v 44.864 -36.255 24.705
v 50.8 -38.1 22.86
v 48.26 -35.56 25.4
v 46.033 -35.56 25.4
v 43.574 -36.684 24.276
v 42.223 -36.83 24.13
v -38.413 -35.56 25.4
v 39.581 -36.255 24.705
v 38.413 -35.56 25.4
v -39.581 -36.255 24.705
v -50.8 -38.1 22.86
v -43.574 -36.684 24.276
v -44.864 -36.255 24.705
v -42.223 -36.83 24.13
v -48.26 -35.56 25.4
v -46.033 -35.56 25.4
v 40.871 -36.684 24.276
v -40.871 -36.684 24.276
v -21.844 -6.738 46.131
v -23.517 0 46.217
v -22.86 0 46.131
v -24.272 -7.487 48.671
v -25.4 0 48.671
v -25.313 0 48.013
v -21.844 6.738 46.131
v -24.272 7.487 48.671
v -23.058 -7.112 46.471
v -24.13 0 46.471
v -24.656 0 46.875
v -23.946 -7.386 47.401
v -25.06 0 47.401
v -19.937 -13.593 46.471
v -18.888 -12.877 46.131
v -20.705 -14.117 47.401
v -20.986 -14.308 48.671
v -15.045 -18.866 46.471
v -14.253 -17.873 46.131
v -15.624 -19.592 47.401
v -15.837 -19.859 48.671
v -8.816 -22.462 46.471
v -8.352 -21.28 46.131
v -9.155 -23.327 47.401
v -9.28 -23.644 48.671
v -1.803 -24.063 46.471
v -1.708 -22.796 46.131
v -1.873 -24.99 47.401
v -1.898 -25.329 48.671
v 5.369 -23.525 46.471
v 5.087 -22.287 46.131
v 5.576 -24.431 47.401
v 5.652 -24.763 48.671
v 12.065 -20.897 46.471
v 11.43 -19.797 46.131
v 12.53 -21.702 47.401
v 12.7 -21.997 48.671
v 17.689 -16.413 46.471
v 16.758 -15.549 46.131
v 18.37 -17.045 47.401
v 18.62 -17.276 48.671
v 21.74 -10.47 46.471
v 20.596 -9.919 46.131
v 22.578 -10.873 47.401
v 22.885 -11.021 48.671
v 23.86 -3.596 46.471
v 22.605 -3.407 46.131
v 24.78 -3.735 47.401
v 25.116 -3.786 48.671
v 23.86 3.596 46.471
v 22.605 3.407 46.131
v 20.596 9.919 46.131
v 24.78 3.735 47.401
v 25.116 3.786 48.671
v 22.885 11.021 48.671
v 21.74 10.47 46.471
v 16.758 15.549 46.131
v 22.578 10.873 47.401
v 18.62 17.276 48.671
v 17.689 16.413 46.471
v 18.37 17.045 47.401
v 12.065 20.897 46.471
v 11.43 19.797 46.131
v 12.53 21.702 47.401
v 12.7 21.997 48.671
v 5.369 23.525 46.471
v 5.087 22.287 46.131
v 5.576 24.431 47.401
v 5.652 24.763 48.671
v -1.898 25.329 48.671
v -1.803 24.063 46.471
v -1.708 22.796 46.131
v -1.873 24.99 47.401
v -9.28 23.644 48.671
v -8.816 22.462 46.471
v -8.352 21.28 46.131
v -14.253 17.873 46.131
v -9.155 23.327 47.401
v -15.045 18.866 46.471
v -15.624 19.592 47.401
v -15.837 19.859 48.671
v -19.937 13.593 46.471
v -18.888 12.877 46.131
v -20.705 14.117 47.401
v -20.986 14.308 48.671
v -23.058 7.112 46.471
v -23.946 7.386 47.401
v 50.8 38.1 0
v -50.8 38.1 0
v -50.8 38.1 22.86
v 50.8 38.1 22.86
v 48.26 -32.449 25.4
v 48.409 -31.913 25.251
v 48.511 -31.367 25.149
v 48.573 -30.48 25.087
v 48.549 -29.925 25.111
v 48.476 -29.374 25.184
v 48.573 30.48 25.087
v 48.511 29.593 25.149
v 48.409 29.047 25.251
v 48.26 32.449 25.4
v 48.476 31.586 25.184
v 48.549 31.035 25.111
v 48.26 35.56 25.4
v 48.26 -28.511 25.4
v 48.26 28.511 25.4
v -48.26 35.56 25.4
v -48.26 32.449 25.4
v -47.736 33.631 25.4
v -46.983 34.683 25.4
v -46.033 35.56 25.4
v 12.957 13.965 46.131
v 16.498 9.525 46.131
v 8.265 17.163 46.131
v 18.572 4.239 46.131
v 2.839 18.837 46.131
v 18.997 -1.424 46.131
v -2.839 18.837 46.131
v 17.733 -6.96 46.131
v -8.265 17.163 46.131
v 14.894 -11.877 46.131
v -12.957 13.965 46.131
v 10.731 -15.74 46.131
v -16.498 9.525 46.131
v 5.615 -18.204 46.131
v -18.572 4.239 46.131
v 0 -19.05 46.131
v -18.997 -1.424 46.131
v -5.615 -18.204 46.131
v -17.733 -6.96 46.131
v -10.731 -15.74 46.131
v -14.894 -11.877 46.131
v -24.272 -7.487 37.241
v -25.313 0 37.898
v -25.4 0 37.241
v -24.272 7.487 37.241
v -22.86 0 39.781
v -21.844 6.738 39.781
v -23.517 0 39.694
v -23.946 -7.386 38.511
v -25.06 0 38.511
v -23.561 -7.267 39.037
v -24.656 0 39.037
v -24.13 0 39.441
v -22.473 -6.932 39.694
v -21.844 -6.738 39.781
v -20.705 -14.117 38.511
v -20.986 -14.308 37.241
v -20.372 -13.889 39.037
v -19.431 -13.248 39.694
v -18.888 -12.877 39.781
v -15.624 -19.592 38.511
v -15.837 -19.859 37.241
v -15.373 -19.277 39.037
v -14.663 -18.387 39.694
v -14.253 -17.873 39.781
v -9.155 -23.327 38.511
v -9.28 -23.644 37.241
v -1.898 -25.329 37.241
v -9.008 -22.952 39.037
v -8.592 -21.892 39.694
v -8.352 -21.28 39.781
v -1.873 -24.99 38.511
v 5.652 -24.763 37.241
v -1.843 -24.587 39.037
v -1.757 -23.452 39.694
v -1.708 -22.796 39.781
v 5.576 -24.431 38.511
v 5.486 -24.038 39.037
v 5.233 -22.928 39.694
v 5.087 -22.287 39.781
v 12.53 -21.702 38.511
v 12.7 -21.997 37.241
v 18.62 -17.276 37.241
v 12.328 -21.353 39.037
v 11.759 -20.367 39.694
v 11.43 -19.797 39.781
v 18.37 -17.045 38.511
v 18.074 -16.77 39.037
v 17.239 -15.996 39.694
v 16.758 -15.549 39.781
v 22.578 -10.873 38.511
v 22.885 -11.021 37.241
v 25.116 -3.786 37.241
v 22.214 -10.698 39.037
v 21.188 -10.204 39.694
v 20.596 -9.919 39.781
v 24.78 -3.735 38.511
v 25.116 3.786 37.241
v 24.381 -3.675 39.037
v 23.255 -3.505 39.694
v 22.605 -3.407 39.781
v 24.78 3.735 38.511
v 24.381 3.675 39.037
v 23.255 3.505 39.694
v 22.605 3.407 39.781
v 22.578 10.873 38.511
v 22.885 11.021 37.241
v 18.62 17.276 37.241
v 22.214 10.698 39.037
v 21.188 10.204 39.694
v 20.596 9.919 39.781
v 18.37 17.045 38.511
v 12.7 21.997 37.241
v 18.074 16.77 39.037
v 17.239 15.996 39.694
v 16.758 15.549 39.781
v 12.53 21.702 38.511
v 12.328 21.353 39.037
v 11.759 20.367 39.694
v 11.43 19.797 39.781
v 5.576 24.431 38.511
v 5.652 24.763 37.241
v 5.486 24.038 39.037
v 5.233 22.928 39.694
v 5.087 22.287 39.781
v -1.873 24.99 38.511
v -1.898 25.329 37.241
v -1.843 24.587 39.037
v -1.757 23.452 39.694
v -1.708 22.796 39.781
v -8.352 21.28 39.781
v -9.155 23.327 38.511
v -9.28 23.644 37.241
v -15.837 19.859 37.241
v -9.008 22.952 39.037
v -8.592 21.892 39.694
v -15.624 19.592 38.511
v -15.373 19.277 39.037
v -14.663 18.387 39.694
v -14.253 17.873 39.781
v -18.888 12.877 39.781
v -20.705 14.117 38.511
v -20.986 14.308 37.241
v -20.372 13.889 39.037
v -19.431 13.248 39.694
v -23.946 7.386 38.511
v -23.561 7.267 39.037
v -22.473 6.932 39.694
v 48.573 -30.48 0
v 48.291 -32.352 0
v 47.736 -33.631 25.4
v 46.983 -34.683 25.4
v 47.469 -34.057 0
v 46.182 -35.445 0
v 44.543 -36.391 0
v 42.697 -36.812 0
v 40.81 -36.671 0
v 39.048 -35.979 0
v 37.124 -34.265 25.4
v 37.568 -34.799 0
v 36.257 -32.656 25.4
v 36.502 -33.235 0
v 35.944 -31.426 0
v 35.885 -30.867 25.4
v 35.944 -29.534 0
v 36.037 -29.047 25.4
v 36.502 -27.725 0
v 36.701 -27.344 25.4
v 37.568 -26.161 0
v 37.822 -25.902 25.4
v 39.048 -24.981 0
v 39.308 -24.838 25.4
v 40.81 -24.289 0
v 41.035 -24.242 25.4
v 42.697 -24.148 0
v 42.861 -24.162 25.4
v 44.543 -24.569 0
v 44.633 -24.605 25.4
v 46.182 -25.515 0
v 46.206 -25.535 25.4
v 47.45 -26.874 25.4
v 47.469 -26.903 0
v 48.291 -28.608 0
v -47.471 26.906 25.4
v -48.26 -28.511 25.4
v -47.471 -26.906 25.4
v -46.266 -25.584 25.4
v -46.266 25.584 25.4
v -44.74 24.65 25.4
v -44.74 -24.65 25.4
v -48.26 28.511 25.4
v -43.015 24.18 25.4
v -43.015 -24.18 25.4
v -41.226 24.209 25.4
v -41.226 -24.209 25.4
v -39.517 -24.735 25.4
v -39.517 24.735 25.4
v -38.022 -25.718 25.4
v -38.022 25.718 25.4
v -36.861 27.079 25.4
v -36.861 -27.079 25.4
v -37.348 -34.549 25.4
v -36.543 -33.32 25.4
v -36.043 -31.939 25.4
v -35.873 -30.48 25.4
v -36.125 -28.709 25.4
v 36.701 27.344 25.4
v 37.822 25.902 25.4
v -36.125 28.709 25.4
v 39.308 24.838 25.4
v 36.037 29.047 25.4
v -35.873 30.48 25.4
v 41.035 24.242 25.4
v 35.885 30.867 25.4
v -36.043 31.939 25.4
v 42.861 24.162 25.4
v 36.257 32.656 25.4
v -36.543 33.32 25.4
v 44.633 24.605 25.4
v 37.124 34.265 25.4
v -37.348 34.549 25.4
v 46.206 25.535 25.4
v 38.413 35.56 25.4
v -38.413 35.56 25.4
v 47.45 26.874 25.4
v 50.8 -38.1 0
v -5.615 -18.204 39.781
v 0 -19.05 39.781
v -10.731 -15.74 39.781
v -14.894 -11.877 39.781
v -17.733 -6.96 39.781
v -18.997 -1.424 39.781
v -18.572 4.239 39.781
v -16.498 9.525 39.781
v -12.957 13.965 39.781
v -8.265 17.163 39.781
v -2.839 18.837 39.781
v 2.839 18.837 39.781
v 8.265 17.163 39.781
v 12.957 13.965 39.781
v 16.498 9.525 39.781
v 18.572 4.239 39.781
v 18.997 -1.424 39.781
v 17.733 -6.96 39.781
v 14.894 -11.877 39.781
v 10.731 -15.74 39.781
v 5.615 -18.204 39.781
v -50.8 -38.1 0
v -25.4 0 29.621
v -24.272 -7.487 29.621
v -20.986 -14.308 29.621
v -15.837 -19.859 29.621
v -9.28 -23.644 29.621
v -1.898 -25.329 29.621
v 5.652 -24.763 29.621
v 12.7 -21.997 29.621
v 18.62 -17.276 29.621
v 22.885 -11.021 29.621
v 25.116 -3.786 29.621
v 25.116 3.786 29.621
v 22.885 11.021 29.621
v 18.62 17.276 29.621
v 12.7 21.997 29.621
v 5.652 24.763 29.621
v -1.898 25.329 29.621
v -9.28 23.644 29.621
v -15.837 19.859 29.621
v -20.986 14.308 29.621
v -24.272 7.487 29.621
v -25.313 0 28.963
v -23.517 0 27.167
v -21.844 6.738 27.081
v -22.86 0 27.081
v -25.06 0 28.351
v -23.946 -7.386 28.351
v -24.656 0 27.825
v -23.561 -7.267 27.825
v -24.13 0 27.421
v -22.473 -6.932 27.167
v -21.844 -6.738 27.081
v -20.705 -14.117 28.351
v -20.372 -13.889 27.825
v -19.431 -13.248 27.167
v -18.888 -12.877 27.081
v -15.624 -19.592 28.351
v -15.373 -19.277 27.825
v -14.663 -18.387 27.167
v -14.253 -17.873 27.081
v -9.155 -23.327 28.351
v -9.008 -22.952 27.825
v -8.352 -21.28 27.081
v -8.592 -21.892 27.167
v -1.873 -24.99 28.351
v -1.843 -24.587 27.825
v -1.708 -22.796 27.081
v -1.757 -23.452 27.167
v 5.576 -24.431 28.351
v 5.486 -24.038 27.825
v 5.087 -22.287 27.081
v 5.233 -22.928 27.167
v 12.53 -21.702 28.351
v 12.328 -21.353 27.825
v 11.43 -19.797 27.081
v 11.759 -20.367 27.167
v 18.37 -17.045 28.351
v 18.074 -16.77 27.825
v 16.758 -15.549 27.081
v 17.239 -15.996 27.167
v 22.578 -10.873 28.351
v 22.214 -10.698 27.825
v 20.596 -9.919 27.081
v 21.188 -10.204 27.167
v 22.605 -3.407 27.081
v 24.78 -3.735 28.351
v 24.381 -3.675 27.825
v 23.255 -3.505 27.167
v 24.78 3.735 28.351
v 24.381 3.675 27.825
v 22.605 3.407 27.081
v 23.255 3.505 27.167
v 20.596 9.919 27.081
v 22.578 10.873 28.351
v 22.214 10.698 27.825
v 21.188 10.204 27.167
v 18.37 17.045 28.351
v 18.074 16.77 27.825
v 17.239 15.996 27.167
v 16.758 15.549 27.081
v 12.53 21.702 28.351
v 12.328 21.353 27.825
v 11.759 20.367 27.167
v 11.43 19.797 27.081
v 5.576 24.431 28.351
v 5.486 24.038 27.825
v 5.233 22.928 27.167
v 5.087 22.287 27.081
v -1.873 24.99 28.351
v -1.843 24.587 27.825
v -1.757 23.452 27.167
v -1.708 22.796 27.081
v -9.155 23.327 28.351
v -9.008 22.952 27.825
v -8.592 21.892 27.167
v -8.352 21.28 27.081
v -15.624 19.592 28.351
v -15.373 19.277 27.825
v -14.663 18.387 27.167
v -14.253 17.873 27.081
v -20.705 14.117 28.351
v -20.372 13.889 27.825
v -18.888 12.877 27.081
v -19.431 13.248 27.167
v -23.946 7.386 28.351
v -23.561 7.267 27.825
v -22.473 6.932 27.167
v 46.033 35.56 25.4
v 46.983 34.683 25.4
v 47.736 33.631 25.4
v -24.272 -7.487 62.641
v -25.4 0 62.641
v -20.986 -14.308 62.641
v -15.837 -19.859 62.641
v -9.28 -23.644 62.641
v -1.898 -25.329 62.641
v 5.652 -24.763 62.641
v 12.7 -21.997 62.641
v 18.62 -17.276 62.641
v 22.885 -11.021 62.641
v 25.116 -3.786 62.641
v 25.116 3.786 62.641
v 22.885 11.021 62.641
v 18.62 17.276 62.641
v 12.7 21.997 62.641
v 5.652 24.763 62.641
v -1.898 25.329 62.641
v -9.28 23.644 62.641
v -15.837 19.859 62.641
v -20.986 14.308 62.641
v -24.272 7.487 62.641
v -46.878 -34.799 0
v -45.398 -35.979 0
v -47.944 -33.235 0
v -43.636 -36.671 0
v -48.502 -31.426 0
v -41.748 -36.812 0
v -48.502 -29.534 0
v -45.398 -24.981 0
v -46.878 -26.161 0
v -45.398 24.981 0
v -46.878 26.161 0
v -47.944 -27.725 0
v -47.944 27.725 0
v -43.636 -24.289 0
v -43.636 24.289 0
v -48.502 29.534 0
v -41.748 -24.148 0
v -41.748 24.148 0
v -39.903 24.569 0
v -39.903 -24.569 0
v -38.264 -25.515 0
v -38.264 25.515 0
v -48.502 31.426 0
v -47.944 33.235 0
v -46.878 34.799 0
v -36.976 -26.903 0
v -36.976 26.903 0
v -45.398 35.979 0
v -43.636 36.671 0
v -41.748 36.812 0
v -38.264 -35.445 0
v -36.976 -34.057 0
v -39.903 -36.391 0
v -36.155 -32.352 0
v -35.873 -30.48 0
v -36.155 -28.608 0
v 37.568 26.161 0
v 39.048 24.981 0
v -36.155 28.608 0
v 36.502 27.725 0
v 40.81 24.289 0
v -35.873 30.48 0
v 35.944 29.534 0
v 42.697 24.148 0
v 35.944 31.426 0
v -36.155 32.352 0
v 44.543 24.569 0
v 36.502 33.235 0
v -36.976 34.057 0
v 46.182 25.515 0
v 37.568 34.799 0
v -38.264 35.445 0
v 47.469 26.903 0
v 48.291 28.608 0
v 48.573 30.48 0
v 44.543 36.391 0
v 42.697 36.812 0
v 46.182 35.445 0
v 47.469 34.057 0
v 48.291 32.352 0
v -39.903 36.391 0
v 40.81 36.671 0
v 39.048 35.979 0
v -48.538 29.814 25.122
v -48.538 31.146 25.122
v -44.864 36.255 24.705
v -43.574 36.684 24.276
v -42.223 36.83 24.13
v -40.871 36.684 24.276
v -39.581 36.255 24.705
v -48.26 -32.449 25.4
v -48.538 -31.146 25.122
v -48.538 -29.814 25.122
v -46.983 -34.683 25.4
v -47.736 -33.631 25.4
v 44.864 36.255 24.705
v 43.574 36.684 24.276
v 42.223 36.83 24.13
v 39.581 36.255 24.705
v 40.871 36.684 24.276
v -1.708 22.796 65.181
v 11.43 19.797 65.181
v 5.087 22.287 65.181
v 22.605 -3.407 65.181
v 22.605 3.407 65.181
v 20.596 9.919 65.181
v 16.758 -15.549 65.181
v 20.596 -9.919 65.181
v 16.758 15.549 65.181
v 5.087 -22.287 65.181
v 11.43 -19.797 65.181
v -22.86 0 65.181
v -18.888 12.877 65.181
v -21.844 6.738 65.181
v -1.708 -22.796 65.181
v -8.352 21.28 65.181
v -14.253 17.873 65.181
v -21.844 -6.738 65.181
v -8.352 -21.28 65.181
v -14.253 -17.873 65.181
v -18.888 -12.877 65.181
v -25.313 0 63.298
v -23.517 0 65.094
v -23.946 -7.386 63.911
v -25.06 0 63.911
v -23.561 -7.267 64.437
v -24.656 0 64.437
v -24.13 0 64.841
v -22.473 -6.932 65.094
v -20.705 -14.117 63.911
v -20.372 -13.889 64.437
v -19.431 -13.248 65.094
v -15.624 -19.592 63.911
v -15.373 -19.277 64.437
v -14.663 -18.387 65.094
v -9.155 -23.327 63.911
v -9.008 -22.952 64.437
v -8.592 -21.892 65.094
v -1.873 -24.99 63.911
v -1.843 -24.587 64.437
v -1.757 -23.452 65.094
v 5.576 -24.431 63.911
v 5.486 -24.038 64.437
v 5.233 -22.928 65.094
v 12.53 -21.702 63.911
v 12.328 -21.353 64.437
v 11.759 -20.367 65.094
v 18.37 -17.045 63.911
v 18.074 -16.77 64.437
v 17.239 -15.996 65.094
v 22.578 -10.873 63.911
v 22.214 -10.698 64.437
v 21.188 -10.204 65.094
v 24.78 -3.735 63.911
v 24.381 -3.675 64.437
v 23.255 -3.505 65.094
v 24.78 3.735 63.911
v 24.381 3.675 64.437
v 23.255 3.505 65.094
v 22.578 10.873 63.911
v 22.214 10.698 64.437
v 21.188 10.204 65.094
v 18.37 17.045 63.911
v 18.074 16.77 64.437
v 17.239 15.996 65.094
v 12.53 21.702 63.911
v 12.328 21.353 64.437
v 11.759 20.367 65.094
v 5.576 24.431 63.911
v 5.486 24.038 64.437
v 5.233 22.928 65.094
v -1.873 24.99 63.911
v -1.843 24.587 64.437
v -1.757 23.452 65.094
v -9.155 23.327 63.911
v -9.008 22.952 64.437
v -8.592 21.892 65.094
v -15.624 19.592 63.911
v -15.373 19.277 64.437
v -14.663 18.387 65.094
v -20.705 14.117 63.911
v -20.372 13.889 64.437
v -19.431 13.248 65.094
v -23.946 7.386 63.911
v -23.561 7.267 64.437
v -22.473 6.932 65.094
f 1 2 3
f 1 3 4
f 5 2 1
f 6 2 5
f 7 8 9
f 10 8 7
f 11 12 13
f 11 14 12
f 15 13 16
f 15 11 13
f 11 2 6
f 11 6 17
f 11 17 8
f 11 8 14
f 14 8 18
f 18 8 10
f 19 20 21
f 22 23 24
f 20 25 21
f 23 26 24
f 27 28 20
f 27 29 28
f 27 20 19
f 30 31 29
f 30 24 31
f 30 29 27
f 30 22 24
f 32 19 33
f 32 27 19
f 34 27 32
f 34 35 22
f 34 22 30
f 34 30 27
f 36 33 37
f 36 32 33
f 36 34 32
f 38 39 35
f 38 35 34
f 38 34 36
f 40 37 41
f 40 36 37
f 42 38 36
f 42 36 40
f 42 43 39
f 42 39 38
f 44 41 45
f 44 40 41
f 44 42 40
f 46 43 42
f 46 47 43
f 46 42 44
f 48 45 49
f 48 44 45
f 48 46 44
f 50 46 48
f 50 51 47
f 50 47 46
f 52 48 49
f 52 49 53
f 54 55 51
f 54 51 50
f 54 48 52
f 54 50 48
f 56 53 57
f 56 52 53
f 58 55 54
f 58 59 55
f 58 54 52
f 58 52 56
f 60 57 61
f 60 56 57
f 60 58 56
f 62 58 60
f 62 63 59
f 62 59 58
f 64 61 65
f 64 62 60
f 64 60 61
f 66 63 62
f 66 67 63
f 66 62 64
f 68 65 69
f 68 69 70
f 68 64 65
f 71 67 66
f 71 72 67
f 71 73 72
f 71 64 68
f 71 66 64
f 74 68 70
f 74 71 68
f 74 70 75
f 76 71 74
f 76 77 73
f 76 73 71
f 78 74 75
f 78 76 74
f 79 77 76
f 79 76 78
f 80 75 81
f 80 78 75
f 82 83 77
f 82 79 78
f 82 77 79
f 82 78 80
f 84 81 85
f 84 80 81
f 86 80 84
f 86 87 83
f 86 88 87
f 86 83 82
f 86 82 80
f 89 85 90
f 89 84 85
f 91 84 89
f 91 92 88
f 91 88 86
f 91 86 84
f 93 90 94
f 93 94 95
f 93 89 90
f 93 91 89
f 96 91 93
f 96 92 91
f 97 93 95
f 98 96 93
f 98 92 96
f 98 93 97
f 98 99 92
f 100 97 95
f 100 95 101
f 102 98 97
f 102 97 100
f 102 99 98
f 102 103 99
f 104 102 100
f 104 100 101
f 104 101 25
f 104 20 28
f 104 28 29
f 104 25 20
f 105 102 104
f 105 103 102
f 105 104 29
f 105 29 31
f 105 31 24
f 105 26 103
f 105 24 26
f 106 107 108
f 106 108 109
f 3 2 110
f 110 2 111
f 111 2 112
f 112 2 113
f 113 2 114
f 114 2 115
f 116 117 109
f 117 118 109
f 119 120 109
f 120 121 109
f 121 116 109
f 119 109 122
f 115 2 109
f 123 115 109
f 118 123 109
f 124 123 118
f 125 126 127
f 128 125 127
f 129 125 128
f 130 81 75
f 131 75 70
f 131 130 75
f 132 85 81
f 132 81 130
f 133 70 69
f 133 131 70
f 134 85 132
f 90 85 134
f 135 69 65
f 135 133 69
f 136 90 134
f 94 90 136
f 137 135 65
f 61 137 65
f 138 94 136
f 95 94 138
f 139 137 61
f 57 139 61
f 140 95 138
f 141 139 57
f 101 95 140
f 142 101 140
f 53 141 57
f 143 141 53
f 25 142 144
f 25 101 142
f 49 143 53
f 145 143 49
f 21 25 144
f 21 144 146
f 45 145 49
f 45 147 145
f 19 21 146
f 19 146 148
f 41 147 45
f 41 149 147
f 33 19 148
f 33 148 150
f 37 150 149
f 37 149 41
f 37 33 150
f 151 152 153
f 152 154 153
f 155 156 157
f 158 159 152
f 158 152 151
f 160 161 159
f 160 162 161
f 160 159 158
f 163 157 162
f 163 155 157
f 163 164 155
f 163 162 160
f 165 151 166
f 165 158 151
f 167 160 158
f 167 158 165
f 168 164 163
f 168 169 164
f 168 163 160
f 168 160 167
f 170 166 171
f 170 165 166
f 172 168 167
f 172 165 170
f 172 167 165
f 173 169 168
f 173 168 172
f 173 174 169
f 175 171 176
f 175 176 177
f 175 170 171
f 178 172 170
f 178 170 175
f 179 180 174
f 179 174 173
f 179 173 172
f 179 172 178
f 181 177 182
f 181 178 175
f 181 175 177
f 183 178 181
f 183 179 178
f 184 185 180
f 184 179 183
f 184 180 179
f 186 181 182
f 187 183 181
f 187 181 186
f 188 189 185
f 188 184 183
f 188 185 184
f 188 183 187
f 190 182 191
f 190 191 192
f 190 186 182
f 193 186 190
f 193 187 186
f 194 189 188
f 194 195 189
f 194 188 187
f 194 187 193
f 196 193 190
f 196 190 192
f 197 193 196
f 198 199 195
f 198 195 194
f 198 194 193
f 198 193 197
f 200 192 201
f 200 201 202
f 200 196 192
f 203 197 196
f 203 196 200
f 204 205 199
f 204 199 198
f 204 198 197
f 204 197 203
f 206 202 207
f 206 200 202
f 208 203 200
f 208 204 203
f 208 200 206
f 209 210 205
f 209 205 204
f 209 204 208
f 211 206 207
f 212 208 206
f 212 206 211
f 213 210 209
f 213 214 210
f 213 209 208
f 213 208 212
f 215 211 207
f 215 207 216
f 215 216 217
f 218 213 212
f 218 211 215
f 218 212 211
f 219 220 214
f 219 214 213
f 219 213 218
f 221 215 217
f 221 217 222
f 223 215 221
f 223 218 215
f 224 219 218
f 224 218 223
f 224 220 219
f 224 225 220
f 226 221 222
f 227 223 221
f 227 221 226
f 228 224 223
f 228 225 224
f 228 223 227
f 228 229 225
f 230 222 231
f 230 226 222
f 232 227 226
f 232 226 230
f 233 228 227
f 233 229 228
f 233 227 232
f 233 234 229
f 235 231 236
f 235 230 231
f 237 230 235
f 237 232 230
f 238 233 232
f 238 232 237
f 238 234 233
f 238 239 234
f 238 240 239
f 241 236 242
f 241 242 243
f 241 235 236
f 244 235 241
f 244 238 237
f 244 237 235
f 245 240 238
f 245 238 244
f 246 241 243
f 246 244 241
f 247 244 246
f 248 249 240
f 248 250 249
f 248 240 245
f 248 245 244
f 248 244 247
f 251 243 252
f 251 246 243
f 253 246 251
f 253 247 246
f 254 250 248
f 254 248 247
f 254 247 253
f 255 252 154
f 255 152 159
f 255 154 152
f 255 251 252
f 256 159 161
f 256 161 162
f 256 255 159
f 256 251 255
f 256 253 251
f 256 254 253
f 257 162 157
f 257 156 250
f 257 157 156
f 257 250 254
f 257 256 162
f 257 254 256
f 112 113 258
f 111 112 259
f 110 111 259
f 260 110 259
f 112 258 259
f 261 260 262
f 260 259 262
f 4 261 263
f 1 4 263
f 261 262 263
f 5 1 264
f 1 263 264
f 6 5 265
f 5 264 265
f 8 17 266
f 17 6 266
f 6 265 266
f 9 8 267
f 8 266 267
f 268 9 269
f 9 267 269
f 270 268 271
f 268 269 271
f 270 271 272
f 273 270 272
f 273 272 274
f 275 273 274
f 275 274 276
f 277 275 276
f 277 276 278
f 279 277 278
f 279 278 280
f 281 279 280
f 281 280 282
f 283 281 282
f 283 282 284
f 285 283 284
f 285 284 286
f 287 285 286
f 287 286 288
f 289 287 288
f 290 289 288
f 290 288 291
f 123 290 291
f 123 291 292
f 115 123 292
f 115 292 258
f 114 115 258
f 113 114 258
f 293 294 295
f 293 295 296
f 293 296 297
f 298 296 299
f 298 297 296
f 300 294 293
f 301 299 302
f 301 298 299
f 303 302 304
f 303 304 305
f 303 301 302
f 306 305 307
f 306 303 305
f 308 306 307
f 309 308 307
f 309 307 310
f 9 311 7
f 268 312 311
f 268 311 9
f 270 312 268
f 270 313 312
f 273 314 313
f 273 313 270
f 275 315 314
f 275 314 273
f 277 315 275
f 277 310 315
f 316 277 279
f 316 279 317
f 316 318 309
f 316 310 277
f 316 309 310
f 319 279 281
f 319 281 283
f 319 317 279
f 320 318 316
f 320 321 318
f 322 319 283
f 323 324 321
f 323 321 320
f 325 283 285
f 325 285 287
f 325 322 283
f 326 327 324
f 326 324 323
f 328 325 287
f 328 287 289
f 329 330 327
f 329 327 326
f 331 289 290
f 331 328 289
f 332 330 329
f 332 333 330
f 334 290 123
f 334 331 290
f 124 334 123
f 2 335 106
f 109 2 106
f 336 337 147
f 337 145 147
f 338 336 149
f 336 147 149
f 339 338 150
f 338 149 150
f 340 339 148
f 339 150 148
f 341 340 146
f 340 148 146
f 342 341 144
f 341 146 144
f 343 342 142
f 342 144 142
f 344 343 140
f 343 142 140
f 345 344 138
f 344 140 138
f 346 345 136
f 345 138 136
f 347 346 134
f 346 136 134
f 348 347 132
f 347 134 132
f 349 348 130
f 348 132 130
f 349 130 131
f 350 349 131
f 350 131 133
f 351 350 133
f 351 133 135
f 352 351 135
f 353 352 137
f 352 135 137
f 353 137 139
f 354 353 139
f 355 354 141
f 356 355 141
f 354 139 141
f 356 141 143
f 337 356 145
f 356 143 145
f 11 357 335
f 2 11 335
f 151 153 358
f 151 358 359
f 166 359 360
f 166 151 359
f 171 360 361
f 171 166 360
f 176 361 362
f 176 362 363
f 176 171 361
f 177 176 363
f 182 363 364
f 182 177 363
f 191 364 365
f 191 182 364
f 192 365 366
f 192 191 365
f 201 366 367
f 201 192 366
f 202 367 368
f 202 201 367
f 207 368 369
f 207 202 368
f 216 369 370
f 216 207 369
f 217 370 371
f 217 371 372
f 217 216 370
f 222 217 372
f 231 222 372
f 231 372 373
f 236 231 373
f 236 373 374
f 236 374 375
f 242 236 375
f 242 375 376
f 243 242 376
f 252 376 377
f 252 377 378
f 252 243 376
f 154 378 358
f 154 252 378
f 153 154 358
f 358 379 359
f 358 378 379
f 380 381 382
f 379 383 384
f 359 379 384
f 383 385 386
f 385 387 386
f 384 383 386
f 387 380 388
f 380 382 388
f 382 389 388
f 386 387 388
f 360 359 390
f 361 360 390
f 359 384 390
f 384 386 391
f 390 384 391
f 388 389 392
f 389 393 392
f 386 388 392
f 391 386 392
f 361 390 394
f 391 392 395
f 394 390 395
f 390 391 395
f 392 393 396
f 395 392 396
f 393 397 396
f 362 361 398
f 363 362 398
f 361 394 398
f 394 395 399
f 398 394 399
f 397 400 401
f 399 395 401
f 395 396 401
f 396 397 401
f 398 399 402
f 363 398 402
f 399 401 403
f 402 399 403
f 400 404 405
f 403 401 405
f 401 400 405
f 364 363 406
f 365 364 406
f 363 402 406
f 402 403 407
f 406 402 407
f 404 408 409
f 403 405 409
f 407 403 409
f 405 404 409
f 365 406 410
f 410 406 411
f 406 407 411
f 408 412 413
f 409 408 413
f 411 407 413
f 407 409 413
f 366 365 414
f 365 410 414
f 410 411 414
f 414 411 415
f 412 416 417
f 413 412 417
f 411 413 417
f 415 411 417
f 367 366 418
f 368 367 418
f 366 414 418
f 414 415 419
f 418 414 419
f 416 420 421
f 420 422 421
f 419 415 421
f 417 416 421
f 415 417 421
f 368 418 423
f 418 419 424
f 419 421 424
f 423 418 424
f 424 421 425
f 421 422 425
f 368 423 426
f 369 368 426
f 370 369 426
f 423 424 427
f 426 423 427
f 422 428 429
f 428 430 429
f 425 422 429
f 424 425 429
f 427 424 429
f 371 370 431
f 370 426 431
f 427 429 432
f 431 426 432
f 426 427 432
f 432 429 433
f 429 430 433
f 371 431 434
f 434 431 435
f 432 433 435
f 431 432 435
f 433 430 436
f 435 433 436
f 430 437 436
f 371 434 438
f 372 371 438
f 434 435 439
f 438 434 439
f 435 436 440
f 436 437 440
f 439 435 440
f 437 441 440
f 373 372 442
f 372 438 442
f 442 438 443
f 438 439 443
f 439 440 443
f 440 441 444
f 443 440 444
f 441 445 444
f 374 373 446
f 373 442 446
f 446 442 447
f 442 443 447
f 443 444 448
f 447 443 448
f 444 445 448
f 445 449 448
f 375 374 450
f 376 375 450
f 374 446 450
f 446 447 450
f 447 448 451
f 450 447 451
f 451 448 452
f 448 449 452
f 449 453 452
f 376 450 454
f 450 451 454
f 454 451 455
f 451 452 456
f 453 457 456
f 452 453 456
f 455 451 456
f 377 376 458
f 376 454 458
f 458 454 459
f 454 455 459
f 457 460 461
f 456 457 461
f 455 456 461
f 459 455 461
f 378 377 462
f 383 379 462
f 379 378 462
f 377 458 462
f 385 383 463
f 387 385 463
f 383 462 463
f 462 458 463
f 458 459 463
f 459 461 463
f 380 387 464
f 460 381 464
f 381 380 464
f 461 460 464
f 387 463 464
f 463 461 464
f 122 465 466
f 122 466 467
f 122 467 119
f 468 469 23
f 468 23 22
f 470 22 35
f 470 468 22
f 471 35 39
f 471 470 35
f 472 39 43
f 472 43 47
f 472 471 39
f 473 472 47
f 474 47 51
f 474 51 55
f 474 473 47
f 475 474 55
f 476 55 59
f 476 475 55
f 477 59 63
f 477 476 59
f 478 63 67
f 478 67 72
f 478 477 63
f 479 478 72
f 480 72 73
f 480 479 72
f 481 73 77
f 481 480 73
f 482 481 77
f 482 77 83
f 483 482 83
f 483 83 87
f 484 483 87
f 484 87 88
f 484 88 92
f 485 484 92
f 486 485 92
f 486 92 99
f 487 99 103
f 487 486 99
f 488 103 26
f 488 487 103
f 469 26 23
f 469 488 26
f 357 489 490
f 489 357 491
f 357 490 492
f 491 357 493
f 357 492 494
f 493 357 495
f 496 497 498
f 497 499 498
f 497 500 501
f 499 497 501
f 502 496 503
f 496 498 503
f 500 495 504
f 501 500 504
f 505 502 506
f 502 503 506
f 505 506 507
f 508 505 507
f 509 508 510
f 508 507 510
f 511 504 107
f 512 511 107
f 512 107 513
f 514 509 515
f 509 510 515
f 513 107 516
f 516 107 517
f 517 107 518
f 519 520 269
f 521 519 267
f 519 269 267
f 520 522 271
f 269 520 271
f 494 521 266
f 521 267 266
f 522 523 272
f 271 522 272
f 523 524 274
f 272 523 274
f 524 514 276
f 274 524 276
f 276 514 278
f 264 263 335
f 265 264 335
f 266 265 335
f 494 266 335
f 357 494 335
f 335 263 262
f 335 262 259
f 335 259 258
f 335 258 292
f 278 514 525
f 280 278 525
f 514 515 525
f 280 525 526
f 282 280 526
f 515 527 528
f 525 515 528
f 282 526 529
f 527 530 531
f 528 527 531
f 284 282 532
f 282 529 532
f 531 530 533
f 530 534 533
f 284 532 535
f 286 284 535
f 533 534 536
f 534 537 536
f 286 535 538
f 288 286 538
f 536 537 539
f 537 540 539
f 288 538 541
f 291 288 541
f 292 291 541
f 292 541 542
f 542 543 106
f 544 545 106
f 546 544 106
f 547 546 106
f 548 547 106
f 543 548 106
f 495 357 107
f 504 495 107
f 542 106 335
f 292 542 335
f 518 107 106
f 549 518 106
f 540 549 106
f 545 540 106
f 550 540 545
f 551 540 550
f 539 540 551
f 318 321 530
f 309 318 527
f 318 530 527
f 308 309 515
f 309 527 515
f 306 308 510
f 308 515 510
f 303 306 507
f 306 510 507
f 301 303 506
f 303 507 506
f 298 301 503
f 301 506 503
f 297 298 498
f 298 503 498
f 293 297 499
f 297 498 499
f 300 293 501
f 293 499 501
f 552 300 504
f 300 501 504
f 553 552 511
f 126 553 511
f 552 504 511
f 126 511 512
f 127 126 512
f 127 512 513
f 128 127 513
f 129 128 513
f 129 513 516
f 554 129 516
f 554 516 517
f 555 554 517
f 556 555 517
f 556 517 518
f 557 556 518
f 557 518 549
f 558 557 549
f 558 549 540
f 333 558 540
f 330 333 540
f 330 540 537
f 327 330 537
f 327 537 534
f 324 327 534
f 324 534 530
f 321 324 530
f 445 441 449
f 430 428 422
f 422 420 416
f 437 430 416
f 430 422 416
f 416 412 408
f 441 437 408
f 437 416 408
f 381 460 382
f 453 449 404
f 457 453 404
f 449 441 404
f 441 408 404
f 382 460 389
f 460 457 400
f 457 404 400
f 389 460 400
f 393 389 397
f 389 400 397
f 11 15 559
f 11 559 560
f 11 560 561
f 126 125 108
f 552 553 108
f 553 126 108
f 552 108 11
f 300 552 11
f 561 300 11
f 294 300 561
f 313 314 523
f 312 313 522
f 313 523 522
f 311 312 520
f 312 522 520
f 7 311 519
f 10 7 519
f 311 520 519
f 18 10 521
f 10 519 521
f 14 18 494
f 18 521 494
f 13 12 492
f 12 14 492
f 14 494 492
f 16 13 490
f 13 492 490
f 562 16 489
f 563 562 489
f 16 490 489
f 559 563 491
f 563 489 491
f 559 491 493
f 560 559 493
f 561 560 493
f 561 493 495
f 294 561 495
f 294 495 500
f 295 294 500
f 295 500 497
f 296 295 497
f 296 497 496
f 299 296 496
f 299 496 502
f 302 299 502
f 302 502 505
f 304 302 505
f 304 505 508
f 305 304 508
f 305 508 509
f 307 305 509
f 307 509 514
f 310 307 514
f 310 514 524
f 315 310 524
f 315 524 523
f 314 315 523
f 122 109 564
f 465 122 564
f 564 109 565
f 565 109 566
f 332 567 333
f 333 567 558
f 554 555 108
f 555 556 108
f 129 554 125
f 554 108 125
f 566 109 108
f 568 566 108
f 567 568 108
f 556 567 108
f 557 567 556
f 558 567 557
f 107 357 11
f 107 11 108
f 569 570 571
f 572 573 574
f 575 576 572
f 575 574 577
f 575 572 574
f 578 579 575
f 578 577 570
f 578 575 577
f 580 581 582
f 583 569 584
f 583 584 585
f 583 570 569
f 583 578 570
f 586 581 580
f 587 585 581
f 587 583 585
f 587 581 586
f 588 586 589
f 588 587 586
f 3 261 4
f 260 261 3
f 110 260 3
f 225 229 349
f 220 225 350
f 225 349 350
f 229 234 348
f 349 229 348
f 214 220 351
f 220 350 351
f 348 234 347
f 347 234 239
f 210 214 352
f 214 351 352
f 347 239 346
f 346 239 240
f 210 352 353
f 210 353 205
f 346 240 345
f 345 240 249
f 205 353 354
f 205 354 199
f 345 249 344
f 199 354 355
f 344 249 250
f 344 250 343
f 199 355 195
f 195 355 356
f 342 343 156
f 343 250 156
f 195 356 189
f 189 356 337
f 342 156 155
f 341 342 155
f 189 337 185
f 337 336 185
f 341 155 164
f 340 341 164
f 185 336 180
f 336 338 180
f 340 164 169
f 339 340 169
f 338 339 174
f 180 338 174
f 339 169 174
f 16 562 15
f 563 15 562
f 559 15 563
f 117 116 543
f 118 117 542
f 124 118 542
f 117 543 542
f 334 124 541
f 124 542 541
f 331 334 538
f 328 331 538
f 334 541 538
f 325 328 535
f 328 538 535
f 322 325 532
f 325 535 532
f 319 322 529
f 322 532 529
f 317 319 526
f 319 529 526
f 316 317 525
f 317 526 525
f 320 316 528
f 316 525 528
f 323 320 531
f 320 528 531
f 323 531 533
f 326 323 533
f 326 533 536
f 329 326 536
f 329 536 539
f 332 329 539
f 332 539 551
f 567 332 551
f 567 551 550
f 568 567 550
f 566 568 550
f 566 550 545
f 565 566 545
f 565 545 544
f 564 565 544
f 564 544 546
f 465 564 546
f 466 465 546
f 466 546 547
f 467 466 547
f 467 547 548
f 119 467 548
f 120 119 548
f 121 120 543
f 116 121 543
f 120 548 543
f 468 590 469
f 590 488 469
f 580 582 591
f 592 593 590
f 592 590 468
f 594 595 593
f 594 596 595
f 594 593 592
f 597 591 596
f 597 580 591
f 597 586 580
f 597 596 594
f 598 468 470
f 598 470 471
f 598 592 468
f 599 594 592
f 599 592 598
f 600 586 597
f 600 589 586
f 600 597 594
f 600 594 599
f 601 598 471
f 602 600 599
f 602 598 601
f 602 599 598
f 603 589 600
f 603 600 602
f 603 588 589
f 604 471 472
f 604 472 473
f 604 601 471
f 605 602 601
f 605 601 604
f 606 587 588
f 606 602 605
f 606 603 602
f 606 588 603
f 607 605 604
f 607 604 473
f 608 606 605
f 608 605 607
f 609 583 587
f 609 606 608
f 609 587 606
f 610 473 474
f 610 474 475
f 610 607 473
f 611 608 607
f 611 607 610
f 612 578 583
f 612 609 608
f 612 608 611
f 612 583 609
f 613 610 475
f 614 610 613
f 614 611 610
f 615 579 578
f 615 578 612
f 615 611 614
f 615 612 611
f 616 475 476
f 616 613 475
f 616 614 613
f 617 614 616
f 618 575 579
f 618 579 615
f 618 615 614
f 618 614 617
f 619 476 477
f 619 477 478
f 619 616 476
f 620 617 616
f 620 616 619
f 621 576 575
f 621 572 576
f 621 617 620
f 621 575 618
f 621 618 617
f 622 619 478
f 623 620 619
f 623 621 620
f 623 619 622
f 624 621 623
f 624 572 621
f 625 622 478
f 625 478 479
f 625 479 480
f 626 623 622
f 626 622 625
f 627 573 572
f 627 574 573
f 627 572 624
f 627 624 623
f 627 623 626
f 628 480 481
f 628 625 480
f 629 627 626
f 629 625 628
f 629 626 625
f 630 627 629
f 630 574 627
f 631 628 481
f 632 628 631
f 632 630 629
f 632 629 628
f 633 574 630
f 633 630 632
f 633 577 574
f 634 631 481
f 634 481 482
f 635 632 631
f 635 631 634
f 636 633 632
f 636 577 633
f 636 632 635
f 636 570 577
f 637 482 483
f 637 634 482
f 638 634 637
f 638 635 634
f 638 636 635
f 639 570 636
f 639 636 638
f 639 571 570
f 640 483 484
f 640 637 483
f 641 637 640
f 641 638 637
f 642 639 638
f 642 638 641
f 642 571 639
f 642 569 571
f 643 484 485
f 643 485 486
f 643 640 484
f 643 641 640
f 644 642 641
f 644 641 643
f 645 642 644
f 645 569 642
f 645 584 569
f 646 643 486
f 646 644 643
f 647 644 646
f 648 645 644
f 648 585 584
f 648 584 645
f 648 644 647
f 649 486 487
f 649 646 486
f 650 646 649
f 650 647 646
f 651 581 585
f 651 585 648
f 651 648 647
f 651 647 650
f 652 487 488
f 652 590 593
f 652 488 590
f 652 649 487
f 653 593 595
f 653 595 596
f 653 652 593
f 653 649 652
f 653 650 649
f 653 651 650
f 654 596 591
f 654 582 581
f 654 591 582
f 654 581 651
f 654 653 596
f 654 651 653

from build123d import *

# Parameters (mm, degrees)
F0_W        = 101.6
F0_H        = 76.2
F1_DEPTH    = 25.4
F2_R        = 6.35
F3_DEPTH    = 25.4
F4_W        = 25.4
F4_H        = 38.1
F6_W        = 23.2788839974
F6_H        = 6.35
F8_T1_DEPTH = 114.6641495789
F8_T3_DEPTH = 89.2641495789
F9_R        = 2.54


# Not quite as in the source:
# - a fillet or chamfer that OpenCascade refuses, or shapes differently, is made with other operations: its cross-section is extruded or revolved along the edge and cut away or added
# - a feature names something its author has since deleted; it is built from what else it names


with BuildPart() as f1:
    # F0 (on Top) → F1 (new body)
    with BuildSketch(Plane.XY):
        Rectangle(F0_W, F0_H)
    extrude(amount=F1_DEPTH)

    # F2 (on face) → F3 (cut)
    with BuildSketch(Plane(origin=(0, 0, 0), x_dir=(1, 0, 0), z_dir=(0, 0, -1))):
        with Locations((-42.2228313982, -30.48)):
            Circle(F2_R)
        with Locations((-42.2228313982, 30.48)):
            Circle(F2_R)
        with Locations((42.2228313982, 30.48)):
            Circle(F2_R)
        with Locations((42.2228313982, -30.48)):
            Circle(F2_R)
    extrude(amount=-F3_DEPTH, mode=Mode.SUBTRACT)

    # F8: chamfer of 2.54 on 4 edges, made by hand

    # F8_s2 → F8_t1 (cut)
    with BuildSketch(Plane.YZ.offset(-57.3320747894)):
        Polygon((-38.1, 22.86), (-35.56, 25.4), (-38.1, 25.4), align=None)
        Polygon((38.1, 22.86), (35.56, 25.4), (38.1, 25.4), align=None)
    extrude(amount=F8_T1_DEPTH, mode=Mode.SUBTRACT)

    # F8_s4 → F8_t3 (cut)
    with BuildSketch(Plane.XZ.offset(-44.6320747894)):
        Polygon((50.8, 22.86), (48.26, 25.4), (50.8, 25.4), align=None)
        Polygon((-48.26, 25.4), (-50.8, 22.86), (-50.8, 25.4), align=None)
    extrude(amount=F8_T3_DEPTH, mode=Mode.SUBTRACT)


with BuildPart() as f5:
    # F4 (on Front) → F5 (revolve)
    with BuildSketch(Plane.XZ):
        with Locations((-12.7, 46.1308773281)):
            Rectangle(F4_W, F4_H)
    revolve(axis=Axis((0, 0, 46.1308773281), (0, 0, 1)))

    # F6 (on Right) → F7 (revolve, cut)
    with BuildSketch(Plane.YZ):
        with Locations((-30.6894419987, 42.9558773281)):
            Rectangle(F6_W, F6_H)
    revolve(axis=Axis((0, 0, 65.1808773281), (0, 0, -1)), mode=Mode.SUBTRACT)

    # F9
    f9_edges = [f5.edges().sort_by_distance(p)[0] for p in [
        (25.4, 0, 27.080877),
        (25.4, 0, 39.780877),
        (25.4, 0, 46.130877),
        (25.4, 0, 65.180877),
    ]]
    fillet(f9_edges, radius=F9_R)


solid = Compound([f1.part, f5.part])
